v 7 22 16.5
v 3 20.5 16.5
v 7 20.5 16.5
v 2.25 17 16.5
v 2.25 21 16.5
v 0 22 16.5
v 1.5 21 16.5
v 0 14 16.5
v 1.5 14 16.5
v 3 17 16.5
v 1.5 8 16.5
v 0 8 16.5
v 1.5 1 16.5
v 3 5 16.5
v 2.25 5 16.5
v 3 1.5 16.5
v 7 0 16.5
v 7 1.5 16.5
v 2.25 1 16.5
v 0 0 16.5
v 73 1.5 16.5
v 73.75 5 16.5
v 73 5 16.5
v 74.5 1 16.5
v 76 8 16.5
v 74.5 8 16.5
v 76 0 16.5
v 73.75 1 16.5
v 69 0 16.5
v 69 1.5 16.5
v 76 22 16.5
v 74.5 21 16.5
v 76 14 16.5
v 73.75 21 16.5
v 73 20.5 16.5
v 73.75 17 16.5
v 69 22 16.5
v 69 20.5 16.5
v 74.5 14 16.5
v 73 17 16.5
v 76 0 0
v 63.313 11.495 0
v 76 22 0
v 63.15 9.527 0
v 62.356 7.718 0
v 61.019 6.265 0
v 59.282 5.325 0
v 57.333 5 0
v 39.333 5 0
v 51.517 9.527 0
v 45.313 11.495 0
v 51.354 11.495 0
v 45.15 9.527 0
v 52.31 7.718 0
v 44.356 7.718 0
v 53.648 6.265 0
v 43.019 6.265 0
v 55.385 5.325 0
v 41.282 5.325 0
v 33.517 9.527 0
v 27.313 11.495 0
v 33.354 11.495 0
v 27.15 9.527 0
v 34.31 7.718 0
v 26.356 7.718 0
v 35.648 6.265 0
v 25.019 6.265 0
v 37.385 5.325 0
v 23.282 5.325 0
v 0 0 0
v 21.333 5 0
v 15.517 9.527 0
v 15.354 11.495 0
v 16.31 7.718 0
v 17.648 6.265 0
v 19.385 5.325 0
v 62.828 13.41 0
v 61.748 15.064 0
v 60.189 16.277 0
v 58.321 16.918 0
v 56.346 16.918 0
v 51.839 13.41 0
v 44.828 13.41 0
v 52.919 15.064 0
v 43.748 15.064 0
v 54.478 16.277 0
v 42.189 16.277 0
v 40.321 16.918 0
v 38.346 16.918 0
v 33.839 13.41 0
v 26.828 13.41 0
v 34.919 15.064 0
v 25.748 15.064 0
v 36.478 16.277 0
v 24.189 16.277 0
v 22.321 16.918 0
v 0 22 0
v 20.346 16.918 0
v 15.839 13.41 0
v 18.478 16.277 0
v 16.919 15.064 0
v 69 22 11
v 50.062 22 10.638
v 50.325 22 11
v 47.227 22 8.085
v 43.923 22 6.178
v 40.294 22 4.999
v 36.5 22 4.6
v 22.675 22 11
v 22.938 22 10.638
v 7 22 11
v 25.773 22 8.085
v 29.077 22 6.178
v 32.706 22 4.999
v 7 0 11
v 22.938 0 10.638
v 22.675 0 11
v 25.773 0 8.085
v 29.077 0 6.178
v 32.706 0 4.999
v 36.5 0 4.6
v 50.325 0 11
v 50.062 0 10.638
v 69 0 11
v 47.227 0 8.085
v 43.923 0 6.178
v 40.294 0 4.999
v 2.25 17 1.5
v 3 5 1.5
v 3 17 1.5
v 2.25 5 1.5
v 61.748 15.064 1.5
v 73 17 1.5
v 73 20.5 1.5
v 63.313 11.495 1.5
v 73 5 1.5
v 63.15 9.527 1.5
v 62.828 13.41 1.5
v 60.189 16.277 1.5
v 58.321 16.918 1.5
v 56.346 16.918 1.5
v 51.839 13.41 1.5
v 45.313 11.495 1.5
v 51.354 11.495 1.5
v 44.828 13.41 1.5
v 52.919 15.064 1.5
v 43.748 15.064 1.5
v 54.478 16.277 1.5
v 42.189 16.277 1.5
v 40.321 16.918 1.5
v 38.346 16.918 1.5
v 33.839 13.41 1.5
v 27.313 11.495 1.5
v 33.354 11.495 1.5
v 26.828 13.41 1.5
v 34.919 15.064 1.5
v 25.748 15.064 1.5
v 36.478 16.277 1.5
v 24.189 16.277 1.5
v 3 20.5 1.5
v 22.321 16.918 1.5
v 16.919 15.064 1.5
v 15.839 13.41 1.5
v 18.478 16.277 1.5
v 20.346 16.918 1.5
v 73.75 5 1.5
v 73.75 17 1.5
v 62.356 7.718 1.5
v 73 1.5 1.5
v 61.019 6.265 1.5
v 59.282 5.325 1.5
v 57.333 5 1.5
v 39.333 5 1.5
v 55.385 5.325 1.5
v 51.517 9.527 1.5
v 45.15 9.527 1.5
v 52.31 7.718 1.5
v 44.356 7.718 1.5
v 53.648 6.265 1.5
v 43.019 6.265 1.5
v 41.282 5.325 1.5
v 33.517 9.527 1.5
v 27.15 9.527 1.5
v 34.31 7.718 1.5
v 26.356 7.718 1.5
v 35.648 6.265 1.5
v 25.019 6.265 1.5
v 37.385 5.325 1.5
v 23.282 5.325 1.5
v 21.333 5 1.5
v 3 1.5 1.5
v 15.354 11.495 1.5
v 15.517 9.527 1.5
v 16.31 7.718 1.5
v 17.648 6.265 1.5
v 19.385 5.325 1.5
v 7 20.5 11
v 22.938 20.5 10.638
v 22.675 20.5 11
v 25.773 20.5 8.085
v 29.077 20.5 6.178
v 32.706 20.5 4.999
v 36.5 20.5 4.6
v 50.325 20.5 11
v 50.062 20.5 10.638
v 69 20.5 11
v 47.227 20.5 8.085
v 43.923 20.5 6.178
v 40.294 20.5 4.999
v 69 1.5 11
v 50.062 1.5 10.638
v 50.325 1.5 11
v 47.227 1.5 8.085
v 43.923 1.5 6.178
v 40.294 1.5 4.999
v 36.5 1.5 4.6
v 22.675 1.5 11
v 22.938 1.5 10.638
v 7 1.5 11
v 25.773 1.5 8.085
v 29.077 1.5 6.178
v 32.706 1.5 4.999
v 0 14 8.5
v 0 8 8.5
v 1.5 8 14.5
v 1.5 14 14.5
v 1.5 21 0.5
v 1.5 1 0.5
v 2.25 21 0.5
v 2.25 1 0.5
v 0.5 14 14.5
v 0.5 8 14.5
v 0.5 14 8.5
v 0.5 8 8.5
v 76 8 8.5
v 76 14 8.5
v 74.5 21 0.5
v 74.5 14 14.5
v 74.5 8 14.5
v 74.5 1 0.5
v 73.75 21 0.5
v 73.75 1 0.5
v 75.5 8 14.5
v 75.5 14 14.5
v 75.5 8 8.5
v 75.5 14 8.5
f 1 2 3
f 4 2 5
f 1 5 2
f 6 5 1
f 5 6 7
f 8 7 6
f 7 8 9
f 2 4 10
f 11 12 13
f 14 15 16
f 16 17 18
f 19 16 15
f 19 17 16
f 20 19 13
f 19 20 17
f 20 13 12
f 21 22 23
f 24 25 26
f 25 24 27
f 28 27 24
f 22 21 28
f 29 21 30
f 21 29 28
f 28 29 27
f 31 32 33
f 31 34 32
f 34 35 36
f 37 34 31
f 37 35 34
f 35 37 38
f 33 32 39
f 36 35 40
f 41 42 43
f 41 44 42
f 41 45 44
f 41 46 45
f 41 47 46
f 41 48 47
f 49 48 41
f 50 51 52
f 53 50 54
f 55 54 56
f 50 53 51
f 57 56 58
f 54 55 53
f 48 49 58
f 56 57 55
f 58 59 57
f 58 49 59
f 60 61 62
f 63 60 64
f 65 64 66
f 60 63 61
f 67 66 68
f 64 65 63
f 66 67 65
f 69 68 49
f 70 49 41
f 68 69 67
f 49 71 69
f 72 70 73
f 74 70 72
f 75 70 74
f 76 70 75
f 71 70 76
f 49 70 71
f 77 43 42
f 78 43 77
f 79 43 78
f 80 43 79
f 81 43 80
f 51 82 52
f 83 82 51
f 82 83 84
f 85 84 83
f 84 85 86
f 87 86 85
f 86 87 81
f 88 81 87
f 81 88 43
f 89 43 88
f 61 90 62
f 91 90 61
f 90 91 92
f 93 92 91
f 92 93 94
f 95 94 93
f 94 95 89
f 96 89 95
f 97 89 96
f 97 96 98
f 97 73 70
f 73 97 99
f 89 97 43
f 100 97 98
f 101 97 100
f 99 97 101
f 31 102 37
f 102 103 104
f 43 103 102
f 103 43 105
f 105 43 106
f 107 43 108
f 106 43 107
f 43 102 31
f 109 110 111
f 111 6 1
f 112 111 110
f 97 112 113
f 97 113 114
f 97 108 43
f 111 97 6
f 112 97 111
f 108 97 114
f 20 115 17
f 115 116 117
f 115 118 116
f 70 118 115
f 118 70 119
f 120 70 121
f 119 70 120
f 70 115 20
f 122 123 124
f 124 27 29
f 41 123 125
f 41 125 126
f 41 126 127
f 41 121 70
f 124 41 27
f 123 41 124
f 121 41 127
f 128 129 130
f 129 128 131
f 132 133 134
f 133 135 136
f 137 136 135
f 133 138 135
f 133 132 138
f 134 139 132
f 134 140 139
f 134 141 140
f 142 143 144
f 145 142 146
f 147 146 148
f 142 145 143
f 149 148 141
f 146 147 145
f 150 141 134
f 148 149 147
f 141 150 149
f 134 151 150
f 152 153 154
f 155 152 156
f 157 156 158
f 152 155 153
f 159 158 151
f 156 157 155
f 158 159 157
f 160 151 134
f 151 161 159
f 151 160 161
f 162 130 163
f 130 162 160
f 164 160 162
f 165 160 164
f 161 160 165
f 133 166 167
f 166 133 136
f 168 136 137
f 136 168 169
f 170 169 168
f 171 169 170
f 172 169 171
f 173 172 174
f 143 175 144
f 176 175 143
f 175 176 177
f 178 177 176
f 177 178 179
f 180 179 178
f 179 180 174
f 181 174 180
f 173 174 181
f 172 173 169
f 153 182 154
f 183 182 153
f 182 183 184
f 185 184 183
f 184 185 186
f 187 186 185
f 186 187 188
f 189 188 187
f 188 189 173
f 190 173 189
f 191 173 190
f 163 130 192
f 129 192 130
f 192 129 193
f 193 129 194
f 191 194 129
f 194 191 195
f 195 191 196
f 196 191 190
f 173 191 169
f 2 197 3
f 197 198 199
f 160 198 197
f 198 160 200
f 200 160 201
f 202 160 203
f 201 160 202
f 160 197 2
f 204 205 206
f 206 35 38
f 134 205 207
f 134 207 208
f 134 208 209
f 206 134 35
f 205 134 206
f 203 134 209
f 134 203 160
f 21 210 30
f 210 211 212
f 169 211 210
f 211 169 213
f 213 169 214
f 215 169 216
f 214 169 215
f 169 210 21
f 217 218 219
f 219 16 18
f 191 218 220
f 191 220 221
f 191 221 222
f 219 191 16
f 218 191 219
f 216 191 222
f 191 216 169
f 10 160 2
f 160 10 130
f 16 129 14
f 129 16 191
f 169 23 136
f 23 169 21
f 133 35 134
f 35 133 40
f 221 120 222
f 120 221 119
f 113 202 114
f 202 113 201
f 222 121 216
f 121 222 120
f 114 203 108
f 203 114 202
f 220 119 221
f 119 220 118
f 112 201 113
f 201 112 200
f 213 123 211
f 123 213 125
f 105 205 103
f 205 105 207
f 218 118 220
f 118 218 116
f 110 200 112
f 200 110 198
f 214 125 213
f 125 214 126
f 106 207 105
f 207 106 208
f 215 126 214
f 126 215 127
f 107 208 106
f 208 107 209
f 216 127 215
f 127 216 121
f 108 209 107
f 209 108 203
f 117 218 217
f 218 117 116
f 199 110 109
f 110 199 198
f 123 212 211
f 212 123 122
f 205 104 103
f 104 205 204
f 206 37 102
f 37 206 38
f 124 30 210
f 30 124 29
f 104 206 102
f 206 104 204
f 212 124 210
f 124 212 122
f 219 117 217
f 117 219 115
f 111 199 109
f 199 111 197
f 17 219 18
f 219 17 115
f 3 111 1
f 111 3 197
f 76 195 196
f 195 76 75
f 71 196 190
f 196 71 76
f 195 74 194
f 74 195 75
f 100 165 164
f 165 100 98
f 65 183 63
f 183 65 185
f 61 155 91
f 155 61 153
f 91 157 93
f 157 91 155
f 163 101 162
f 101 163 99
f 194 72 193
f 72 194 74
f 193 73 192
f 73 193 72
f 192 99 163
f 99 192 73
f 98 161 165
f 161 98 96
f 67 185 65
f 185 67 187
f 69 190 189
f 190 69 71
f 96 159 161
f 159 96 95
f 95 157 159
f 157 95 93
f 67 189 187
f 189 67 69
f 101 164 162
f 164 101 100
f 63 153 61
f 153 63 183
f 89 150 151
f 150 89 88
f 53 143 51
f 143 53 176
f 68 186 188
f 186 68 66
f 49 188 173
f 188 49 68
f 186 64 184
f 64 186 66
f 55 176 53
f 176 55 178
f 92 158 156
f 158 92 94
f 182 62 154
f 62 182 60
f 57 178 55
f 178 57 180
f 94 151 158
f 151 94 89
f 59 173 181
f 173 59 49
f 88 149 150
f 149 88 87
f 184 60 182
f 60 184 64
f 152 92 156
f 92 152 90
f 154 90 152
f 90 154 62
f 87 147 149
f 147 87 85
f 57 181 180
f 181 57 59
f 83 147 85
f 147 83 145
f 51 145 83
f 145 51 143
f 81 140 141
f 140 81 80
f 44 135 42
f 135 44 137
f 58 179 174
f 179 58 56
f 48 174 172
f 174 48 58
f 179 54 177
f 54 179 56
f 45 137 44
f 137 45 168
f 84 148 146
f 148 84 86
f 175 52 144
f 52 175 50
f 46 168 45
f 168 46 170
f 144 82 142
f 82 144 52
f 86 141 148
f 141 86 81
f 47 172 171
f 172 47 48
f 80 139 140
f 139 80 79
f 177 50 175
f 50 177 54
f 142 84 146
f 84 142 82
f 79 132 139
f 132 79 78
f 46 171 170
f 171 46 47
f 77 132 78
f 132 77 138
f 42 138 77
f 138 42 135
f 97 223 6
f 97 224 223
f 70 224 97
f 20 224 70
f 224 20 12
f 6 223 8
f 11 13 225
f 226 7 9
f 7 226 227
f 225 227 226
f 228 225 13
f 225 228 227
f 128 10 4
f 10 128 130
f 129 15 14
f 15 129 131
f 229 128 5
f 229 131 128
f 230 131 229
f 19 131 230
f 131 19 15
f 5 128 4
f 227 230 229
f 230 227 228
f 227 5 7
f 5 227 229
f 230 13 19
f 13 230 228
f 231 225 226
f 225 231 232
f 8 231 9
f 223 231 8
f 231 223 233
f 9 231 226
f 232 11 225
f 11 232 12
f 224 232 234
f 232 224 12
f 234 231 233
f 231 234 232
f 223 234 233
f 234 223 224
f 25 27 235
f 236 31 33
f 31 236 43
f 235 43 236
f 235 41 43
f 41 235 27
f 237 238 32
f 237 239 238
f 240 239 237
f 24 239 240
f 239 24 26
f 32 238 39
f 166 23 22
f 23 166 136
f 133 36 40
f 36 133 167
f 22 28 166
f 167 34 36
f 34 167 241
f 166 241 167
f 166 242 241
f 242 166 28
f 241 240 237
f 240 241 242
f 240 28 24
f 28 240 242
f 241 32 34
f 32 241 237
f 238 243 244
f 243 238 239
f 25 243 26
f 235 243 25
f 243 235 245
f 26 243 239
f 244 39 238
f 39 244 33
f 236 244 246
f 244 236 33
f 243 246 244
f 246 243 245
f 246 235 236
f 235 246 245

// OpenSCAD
holder_tickness  = 1.5;

holder_width_int = 19; //mm
holder_width_ext =holder_width_int + 2*holder_tickness; //mm

holder_length_int = 73; //mm
holder_length_ext = holder_length_int+ 2*holder_tickness; //mm

/*same heigh but interior box is offset holder_tickness*/
holder_height_int  = 15;
holder_height_ext  = 15+ holder_tickness;

batt_length = 65; //mm
batt_width  = 18; //mm

/*Battey 18650*/
bat_length = 65;
bat_width = 18;

contact_pin_diameter =11;

module battery_model(width,length,high){
    rotate ([0,90,0])
    cylinder( 66 , d=width);

}
module battery_cut(width,length,high,tickness){
    translate([-tickness-1,0,0])
    cube([length+2+2*tickness,width,high]);
}

module battery_body(width,length,height){
color("red")
cube([length,width,height]);
}


module battery_box(width, length,height,tickness){

    difference()
    {
    
        battery_body(width+ (2*tickness),
             length + (2*tickness),
             height + (tickness));
        translate( [tickness  ,
                    tickness,
                    tickness])
        battery_cut(width,
                    length,
                    height+tickness,
        tickness);
    }
}


module battery_contact_holder(width, length,height,tickness, contact_d){

    difference(){//pin connector slot
    difference()
    {
    difference()
    {
    difference(){
    {
        color("green")
        translate([0,0,0])
        cube([2*tickness,width+2*tickness,height]);
     //   color("blue")
       // translate([length,0,0])
        //cube([2*tickness,width+2*tickness,height]);
    }
       translate([tickness,((2*tickness+width)-(contact_d+1))/2,tickness])
       cube([tickness+1,contact_d+1,height+1]);
    
    }
    color("red")
       translate([tickness,tickness-(1/2),tickness-1])
       cube([tickness/2,width+1,height+1]);
    }
    color("white");
       translate([-tickness,((2*tickness+width)-6)/2,height-2])
       cube([3,6,2]);
    }
       color("white");
       translate([-tickness,((2*tickness+width)-6)/2,height-8])
       cube([2,6,8]);
    }


}


/*******************************************************/


/*Places battery inside the battery holder*/


/*translate([(holder_length_int+ (holder_tickness)-bat_length)/2,holder_tickness+holder_width_int/2,holder_tickness+bat_width/2])
battery_model(bat_width,bat_length,holder_tickness);
*/

/*Draw the Enclosure*/
module battery_holder_full(){

difference(){//bottom cylinders
difference(){//top square len part
difference(){//cylinder middle len
difference(){//contact borders

battery_box(holder_width_int  ,
            holder_length_int ,
            holder_height_int ,
            holder_tickness)  ;
    {
    cube([2*holder_tickness,holder_width_int+1+2*holder_tickness,holder_height_ext+1]);
    translate([holder_length_int,0,0])
    cube([2*holder_tickness,holder_width_int+1+2*holder_tickness,holder_height_ext+1]);
    }
}
    translate([holder_length_int/2,0,(holder_height_ext/2)+holder_length_int/5])
    rotate([0,90,90])
    cylinder( 80, d=holder_length_int/2);

}
    translate([holder_tickness*2 +4,0,holder_height_int-4])
//    rotate([0,45,0])
    cube([holder_length_int-8-holder_tickness-holder_tickness,holder_width_ext,holder_height_int]);    
    }
    {
    translate([holder_length_int/3 - 12/4 ,
        12/4 +holder_width_int/2 - holder_tickness,
        10])
    rotate([0,180,90])
    {
        cylinder( 80, d=12);
        translate([0,-12-6,0])
        cylinder( 80, d=12);
        translate([0,-12-12-12,0])        
        cylinder( 80, d=12);

    }
    }
}
battery_contact_holder(holder_width_int  ,
          holder_length_int ,
        holder_height_ext ,
      holder_tickness,
    contact_pin_diameter)  ;

translate([holder_length_int+holder_tickness*2,holder_width_int+2*holder_tickness,0])
rotate([0,0,180])
battery_contact_holder(holder_width_int  ,
          holder_length_int ,
        holder_height_ext ,
      holder_tickness,
    contact_pin_diameter)  ;

}


battery_holder_full();
/*Battery snap part*/

/*
//    difference(){
    difference(){
    {    color("white")
    translate([holder_tickness*2 +5,
                holder_tickness,
                holder_height_int-8])
    rotate([0,-45,0])
    cube([4,
          holder_width_int+2,
          5.5+2]);    
    }
    {
    translate([holder_tickness*2+5,
           (holder_width_int-bat_width)/2 +holder_tickness,
            holder_height_int-8])
    rotate([0,-45,0])
    color("pink")
    cube([4,
          bat_width,
          5.5+3]);    
    }
    }
    */
    
//    translate([(holder_length_int+ (holder_tickness)-bat_length)/2,holder_tickness+holder_width_int/2,holder_tickness+//bat_width/2])
    //battery_model(bat_width,bat_length,holder_tickness);

  //  }


/*   
color("gray")
    translate([holder_tickness*2,0,holder_height_int-4])
    cube([holder_length_int-holder_tickness-holder_tickness,holder_width_ext,holder_height_int]);
*/
